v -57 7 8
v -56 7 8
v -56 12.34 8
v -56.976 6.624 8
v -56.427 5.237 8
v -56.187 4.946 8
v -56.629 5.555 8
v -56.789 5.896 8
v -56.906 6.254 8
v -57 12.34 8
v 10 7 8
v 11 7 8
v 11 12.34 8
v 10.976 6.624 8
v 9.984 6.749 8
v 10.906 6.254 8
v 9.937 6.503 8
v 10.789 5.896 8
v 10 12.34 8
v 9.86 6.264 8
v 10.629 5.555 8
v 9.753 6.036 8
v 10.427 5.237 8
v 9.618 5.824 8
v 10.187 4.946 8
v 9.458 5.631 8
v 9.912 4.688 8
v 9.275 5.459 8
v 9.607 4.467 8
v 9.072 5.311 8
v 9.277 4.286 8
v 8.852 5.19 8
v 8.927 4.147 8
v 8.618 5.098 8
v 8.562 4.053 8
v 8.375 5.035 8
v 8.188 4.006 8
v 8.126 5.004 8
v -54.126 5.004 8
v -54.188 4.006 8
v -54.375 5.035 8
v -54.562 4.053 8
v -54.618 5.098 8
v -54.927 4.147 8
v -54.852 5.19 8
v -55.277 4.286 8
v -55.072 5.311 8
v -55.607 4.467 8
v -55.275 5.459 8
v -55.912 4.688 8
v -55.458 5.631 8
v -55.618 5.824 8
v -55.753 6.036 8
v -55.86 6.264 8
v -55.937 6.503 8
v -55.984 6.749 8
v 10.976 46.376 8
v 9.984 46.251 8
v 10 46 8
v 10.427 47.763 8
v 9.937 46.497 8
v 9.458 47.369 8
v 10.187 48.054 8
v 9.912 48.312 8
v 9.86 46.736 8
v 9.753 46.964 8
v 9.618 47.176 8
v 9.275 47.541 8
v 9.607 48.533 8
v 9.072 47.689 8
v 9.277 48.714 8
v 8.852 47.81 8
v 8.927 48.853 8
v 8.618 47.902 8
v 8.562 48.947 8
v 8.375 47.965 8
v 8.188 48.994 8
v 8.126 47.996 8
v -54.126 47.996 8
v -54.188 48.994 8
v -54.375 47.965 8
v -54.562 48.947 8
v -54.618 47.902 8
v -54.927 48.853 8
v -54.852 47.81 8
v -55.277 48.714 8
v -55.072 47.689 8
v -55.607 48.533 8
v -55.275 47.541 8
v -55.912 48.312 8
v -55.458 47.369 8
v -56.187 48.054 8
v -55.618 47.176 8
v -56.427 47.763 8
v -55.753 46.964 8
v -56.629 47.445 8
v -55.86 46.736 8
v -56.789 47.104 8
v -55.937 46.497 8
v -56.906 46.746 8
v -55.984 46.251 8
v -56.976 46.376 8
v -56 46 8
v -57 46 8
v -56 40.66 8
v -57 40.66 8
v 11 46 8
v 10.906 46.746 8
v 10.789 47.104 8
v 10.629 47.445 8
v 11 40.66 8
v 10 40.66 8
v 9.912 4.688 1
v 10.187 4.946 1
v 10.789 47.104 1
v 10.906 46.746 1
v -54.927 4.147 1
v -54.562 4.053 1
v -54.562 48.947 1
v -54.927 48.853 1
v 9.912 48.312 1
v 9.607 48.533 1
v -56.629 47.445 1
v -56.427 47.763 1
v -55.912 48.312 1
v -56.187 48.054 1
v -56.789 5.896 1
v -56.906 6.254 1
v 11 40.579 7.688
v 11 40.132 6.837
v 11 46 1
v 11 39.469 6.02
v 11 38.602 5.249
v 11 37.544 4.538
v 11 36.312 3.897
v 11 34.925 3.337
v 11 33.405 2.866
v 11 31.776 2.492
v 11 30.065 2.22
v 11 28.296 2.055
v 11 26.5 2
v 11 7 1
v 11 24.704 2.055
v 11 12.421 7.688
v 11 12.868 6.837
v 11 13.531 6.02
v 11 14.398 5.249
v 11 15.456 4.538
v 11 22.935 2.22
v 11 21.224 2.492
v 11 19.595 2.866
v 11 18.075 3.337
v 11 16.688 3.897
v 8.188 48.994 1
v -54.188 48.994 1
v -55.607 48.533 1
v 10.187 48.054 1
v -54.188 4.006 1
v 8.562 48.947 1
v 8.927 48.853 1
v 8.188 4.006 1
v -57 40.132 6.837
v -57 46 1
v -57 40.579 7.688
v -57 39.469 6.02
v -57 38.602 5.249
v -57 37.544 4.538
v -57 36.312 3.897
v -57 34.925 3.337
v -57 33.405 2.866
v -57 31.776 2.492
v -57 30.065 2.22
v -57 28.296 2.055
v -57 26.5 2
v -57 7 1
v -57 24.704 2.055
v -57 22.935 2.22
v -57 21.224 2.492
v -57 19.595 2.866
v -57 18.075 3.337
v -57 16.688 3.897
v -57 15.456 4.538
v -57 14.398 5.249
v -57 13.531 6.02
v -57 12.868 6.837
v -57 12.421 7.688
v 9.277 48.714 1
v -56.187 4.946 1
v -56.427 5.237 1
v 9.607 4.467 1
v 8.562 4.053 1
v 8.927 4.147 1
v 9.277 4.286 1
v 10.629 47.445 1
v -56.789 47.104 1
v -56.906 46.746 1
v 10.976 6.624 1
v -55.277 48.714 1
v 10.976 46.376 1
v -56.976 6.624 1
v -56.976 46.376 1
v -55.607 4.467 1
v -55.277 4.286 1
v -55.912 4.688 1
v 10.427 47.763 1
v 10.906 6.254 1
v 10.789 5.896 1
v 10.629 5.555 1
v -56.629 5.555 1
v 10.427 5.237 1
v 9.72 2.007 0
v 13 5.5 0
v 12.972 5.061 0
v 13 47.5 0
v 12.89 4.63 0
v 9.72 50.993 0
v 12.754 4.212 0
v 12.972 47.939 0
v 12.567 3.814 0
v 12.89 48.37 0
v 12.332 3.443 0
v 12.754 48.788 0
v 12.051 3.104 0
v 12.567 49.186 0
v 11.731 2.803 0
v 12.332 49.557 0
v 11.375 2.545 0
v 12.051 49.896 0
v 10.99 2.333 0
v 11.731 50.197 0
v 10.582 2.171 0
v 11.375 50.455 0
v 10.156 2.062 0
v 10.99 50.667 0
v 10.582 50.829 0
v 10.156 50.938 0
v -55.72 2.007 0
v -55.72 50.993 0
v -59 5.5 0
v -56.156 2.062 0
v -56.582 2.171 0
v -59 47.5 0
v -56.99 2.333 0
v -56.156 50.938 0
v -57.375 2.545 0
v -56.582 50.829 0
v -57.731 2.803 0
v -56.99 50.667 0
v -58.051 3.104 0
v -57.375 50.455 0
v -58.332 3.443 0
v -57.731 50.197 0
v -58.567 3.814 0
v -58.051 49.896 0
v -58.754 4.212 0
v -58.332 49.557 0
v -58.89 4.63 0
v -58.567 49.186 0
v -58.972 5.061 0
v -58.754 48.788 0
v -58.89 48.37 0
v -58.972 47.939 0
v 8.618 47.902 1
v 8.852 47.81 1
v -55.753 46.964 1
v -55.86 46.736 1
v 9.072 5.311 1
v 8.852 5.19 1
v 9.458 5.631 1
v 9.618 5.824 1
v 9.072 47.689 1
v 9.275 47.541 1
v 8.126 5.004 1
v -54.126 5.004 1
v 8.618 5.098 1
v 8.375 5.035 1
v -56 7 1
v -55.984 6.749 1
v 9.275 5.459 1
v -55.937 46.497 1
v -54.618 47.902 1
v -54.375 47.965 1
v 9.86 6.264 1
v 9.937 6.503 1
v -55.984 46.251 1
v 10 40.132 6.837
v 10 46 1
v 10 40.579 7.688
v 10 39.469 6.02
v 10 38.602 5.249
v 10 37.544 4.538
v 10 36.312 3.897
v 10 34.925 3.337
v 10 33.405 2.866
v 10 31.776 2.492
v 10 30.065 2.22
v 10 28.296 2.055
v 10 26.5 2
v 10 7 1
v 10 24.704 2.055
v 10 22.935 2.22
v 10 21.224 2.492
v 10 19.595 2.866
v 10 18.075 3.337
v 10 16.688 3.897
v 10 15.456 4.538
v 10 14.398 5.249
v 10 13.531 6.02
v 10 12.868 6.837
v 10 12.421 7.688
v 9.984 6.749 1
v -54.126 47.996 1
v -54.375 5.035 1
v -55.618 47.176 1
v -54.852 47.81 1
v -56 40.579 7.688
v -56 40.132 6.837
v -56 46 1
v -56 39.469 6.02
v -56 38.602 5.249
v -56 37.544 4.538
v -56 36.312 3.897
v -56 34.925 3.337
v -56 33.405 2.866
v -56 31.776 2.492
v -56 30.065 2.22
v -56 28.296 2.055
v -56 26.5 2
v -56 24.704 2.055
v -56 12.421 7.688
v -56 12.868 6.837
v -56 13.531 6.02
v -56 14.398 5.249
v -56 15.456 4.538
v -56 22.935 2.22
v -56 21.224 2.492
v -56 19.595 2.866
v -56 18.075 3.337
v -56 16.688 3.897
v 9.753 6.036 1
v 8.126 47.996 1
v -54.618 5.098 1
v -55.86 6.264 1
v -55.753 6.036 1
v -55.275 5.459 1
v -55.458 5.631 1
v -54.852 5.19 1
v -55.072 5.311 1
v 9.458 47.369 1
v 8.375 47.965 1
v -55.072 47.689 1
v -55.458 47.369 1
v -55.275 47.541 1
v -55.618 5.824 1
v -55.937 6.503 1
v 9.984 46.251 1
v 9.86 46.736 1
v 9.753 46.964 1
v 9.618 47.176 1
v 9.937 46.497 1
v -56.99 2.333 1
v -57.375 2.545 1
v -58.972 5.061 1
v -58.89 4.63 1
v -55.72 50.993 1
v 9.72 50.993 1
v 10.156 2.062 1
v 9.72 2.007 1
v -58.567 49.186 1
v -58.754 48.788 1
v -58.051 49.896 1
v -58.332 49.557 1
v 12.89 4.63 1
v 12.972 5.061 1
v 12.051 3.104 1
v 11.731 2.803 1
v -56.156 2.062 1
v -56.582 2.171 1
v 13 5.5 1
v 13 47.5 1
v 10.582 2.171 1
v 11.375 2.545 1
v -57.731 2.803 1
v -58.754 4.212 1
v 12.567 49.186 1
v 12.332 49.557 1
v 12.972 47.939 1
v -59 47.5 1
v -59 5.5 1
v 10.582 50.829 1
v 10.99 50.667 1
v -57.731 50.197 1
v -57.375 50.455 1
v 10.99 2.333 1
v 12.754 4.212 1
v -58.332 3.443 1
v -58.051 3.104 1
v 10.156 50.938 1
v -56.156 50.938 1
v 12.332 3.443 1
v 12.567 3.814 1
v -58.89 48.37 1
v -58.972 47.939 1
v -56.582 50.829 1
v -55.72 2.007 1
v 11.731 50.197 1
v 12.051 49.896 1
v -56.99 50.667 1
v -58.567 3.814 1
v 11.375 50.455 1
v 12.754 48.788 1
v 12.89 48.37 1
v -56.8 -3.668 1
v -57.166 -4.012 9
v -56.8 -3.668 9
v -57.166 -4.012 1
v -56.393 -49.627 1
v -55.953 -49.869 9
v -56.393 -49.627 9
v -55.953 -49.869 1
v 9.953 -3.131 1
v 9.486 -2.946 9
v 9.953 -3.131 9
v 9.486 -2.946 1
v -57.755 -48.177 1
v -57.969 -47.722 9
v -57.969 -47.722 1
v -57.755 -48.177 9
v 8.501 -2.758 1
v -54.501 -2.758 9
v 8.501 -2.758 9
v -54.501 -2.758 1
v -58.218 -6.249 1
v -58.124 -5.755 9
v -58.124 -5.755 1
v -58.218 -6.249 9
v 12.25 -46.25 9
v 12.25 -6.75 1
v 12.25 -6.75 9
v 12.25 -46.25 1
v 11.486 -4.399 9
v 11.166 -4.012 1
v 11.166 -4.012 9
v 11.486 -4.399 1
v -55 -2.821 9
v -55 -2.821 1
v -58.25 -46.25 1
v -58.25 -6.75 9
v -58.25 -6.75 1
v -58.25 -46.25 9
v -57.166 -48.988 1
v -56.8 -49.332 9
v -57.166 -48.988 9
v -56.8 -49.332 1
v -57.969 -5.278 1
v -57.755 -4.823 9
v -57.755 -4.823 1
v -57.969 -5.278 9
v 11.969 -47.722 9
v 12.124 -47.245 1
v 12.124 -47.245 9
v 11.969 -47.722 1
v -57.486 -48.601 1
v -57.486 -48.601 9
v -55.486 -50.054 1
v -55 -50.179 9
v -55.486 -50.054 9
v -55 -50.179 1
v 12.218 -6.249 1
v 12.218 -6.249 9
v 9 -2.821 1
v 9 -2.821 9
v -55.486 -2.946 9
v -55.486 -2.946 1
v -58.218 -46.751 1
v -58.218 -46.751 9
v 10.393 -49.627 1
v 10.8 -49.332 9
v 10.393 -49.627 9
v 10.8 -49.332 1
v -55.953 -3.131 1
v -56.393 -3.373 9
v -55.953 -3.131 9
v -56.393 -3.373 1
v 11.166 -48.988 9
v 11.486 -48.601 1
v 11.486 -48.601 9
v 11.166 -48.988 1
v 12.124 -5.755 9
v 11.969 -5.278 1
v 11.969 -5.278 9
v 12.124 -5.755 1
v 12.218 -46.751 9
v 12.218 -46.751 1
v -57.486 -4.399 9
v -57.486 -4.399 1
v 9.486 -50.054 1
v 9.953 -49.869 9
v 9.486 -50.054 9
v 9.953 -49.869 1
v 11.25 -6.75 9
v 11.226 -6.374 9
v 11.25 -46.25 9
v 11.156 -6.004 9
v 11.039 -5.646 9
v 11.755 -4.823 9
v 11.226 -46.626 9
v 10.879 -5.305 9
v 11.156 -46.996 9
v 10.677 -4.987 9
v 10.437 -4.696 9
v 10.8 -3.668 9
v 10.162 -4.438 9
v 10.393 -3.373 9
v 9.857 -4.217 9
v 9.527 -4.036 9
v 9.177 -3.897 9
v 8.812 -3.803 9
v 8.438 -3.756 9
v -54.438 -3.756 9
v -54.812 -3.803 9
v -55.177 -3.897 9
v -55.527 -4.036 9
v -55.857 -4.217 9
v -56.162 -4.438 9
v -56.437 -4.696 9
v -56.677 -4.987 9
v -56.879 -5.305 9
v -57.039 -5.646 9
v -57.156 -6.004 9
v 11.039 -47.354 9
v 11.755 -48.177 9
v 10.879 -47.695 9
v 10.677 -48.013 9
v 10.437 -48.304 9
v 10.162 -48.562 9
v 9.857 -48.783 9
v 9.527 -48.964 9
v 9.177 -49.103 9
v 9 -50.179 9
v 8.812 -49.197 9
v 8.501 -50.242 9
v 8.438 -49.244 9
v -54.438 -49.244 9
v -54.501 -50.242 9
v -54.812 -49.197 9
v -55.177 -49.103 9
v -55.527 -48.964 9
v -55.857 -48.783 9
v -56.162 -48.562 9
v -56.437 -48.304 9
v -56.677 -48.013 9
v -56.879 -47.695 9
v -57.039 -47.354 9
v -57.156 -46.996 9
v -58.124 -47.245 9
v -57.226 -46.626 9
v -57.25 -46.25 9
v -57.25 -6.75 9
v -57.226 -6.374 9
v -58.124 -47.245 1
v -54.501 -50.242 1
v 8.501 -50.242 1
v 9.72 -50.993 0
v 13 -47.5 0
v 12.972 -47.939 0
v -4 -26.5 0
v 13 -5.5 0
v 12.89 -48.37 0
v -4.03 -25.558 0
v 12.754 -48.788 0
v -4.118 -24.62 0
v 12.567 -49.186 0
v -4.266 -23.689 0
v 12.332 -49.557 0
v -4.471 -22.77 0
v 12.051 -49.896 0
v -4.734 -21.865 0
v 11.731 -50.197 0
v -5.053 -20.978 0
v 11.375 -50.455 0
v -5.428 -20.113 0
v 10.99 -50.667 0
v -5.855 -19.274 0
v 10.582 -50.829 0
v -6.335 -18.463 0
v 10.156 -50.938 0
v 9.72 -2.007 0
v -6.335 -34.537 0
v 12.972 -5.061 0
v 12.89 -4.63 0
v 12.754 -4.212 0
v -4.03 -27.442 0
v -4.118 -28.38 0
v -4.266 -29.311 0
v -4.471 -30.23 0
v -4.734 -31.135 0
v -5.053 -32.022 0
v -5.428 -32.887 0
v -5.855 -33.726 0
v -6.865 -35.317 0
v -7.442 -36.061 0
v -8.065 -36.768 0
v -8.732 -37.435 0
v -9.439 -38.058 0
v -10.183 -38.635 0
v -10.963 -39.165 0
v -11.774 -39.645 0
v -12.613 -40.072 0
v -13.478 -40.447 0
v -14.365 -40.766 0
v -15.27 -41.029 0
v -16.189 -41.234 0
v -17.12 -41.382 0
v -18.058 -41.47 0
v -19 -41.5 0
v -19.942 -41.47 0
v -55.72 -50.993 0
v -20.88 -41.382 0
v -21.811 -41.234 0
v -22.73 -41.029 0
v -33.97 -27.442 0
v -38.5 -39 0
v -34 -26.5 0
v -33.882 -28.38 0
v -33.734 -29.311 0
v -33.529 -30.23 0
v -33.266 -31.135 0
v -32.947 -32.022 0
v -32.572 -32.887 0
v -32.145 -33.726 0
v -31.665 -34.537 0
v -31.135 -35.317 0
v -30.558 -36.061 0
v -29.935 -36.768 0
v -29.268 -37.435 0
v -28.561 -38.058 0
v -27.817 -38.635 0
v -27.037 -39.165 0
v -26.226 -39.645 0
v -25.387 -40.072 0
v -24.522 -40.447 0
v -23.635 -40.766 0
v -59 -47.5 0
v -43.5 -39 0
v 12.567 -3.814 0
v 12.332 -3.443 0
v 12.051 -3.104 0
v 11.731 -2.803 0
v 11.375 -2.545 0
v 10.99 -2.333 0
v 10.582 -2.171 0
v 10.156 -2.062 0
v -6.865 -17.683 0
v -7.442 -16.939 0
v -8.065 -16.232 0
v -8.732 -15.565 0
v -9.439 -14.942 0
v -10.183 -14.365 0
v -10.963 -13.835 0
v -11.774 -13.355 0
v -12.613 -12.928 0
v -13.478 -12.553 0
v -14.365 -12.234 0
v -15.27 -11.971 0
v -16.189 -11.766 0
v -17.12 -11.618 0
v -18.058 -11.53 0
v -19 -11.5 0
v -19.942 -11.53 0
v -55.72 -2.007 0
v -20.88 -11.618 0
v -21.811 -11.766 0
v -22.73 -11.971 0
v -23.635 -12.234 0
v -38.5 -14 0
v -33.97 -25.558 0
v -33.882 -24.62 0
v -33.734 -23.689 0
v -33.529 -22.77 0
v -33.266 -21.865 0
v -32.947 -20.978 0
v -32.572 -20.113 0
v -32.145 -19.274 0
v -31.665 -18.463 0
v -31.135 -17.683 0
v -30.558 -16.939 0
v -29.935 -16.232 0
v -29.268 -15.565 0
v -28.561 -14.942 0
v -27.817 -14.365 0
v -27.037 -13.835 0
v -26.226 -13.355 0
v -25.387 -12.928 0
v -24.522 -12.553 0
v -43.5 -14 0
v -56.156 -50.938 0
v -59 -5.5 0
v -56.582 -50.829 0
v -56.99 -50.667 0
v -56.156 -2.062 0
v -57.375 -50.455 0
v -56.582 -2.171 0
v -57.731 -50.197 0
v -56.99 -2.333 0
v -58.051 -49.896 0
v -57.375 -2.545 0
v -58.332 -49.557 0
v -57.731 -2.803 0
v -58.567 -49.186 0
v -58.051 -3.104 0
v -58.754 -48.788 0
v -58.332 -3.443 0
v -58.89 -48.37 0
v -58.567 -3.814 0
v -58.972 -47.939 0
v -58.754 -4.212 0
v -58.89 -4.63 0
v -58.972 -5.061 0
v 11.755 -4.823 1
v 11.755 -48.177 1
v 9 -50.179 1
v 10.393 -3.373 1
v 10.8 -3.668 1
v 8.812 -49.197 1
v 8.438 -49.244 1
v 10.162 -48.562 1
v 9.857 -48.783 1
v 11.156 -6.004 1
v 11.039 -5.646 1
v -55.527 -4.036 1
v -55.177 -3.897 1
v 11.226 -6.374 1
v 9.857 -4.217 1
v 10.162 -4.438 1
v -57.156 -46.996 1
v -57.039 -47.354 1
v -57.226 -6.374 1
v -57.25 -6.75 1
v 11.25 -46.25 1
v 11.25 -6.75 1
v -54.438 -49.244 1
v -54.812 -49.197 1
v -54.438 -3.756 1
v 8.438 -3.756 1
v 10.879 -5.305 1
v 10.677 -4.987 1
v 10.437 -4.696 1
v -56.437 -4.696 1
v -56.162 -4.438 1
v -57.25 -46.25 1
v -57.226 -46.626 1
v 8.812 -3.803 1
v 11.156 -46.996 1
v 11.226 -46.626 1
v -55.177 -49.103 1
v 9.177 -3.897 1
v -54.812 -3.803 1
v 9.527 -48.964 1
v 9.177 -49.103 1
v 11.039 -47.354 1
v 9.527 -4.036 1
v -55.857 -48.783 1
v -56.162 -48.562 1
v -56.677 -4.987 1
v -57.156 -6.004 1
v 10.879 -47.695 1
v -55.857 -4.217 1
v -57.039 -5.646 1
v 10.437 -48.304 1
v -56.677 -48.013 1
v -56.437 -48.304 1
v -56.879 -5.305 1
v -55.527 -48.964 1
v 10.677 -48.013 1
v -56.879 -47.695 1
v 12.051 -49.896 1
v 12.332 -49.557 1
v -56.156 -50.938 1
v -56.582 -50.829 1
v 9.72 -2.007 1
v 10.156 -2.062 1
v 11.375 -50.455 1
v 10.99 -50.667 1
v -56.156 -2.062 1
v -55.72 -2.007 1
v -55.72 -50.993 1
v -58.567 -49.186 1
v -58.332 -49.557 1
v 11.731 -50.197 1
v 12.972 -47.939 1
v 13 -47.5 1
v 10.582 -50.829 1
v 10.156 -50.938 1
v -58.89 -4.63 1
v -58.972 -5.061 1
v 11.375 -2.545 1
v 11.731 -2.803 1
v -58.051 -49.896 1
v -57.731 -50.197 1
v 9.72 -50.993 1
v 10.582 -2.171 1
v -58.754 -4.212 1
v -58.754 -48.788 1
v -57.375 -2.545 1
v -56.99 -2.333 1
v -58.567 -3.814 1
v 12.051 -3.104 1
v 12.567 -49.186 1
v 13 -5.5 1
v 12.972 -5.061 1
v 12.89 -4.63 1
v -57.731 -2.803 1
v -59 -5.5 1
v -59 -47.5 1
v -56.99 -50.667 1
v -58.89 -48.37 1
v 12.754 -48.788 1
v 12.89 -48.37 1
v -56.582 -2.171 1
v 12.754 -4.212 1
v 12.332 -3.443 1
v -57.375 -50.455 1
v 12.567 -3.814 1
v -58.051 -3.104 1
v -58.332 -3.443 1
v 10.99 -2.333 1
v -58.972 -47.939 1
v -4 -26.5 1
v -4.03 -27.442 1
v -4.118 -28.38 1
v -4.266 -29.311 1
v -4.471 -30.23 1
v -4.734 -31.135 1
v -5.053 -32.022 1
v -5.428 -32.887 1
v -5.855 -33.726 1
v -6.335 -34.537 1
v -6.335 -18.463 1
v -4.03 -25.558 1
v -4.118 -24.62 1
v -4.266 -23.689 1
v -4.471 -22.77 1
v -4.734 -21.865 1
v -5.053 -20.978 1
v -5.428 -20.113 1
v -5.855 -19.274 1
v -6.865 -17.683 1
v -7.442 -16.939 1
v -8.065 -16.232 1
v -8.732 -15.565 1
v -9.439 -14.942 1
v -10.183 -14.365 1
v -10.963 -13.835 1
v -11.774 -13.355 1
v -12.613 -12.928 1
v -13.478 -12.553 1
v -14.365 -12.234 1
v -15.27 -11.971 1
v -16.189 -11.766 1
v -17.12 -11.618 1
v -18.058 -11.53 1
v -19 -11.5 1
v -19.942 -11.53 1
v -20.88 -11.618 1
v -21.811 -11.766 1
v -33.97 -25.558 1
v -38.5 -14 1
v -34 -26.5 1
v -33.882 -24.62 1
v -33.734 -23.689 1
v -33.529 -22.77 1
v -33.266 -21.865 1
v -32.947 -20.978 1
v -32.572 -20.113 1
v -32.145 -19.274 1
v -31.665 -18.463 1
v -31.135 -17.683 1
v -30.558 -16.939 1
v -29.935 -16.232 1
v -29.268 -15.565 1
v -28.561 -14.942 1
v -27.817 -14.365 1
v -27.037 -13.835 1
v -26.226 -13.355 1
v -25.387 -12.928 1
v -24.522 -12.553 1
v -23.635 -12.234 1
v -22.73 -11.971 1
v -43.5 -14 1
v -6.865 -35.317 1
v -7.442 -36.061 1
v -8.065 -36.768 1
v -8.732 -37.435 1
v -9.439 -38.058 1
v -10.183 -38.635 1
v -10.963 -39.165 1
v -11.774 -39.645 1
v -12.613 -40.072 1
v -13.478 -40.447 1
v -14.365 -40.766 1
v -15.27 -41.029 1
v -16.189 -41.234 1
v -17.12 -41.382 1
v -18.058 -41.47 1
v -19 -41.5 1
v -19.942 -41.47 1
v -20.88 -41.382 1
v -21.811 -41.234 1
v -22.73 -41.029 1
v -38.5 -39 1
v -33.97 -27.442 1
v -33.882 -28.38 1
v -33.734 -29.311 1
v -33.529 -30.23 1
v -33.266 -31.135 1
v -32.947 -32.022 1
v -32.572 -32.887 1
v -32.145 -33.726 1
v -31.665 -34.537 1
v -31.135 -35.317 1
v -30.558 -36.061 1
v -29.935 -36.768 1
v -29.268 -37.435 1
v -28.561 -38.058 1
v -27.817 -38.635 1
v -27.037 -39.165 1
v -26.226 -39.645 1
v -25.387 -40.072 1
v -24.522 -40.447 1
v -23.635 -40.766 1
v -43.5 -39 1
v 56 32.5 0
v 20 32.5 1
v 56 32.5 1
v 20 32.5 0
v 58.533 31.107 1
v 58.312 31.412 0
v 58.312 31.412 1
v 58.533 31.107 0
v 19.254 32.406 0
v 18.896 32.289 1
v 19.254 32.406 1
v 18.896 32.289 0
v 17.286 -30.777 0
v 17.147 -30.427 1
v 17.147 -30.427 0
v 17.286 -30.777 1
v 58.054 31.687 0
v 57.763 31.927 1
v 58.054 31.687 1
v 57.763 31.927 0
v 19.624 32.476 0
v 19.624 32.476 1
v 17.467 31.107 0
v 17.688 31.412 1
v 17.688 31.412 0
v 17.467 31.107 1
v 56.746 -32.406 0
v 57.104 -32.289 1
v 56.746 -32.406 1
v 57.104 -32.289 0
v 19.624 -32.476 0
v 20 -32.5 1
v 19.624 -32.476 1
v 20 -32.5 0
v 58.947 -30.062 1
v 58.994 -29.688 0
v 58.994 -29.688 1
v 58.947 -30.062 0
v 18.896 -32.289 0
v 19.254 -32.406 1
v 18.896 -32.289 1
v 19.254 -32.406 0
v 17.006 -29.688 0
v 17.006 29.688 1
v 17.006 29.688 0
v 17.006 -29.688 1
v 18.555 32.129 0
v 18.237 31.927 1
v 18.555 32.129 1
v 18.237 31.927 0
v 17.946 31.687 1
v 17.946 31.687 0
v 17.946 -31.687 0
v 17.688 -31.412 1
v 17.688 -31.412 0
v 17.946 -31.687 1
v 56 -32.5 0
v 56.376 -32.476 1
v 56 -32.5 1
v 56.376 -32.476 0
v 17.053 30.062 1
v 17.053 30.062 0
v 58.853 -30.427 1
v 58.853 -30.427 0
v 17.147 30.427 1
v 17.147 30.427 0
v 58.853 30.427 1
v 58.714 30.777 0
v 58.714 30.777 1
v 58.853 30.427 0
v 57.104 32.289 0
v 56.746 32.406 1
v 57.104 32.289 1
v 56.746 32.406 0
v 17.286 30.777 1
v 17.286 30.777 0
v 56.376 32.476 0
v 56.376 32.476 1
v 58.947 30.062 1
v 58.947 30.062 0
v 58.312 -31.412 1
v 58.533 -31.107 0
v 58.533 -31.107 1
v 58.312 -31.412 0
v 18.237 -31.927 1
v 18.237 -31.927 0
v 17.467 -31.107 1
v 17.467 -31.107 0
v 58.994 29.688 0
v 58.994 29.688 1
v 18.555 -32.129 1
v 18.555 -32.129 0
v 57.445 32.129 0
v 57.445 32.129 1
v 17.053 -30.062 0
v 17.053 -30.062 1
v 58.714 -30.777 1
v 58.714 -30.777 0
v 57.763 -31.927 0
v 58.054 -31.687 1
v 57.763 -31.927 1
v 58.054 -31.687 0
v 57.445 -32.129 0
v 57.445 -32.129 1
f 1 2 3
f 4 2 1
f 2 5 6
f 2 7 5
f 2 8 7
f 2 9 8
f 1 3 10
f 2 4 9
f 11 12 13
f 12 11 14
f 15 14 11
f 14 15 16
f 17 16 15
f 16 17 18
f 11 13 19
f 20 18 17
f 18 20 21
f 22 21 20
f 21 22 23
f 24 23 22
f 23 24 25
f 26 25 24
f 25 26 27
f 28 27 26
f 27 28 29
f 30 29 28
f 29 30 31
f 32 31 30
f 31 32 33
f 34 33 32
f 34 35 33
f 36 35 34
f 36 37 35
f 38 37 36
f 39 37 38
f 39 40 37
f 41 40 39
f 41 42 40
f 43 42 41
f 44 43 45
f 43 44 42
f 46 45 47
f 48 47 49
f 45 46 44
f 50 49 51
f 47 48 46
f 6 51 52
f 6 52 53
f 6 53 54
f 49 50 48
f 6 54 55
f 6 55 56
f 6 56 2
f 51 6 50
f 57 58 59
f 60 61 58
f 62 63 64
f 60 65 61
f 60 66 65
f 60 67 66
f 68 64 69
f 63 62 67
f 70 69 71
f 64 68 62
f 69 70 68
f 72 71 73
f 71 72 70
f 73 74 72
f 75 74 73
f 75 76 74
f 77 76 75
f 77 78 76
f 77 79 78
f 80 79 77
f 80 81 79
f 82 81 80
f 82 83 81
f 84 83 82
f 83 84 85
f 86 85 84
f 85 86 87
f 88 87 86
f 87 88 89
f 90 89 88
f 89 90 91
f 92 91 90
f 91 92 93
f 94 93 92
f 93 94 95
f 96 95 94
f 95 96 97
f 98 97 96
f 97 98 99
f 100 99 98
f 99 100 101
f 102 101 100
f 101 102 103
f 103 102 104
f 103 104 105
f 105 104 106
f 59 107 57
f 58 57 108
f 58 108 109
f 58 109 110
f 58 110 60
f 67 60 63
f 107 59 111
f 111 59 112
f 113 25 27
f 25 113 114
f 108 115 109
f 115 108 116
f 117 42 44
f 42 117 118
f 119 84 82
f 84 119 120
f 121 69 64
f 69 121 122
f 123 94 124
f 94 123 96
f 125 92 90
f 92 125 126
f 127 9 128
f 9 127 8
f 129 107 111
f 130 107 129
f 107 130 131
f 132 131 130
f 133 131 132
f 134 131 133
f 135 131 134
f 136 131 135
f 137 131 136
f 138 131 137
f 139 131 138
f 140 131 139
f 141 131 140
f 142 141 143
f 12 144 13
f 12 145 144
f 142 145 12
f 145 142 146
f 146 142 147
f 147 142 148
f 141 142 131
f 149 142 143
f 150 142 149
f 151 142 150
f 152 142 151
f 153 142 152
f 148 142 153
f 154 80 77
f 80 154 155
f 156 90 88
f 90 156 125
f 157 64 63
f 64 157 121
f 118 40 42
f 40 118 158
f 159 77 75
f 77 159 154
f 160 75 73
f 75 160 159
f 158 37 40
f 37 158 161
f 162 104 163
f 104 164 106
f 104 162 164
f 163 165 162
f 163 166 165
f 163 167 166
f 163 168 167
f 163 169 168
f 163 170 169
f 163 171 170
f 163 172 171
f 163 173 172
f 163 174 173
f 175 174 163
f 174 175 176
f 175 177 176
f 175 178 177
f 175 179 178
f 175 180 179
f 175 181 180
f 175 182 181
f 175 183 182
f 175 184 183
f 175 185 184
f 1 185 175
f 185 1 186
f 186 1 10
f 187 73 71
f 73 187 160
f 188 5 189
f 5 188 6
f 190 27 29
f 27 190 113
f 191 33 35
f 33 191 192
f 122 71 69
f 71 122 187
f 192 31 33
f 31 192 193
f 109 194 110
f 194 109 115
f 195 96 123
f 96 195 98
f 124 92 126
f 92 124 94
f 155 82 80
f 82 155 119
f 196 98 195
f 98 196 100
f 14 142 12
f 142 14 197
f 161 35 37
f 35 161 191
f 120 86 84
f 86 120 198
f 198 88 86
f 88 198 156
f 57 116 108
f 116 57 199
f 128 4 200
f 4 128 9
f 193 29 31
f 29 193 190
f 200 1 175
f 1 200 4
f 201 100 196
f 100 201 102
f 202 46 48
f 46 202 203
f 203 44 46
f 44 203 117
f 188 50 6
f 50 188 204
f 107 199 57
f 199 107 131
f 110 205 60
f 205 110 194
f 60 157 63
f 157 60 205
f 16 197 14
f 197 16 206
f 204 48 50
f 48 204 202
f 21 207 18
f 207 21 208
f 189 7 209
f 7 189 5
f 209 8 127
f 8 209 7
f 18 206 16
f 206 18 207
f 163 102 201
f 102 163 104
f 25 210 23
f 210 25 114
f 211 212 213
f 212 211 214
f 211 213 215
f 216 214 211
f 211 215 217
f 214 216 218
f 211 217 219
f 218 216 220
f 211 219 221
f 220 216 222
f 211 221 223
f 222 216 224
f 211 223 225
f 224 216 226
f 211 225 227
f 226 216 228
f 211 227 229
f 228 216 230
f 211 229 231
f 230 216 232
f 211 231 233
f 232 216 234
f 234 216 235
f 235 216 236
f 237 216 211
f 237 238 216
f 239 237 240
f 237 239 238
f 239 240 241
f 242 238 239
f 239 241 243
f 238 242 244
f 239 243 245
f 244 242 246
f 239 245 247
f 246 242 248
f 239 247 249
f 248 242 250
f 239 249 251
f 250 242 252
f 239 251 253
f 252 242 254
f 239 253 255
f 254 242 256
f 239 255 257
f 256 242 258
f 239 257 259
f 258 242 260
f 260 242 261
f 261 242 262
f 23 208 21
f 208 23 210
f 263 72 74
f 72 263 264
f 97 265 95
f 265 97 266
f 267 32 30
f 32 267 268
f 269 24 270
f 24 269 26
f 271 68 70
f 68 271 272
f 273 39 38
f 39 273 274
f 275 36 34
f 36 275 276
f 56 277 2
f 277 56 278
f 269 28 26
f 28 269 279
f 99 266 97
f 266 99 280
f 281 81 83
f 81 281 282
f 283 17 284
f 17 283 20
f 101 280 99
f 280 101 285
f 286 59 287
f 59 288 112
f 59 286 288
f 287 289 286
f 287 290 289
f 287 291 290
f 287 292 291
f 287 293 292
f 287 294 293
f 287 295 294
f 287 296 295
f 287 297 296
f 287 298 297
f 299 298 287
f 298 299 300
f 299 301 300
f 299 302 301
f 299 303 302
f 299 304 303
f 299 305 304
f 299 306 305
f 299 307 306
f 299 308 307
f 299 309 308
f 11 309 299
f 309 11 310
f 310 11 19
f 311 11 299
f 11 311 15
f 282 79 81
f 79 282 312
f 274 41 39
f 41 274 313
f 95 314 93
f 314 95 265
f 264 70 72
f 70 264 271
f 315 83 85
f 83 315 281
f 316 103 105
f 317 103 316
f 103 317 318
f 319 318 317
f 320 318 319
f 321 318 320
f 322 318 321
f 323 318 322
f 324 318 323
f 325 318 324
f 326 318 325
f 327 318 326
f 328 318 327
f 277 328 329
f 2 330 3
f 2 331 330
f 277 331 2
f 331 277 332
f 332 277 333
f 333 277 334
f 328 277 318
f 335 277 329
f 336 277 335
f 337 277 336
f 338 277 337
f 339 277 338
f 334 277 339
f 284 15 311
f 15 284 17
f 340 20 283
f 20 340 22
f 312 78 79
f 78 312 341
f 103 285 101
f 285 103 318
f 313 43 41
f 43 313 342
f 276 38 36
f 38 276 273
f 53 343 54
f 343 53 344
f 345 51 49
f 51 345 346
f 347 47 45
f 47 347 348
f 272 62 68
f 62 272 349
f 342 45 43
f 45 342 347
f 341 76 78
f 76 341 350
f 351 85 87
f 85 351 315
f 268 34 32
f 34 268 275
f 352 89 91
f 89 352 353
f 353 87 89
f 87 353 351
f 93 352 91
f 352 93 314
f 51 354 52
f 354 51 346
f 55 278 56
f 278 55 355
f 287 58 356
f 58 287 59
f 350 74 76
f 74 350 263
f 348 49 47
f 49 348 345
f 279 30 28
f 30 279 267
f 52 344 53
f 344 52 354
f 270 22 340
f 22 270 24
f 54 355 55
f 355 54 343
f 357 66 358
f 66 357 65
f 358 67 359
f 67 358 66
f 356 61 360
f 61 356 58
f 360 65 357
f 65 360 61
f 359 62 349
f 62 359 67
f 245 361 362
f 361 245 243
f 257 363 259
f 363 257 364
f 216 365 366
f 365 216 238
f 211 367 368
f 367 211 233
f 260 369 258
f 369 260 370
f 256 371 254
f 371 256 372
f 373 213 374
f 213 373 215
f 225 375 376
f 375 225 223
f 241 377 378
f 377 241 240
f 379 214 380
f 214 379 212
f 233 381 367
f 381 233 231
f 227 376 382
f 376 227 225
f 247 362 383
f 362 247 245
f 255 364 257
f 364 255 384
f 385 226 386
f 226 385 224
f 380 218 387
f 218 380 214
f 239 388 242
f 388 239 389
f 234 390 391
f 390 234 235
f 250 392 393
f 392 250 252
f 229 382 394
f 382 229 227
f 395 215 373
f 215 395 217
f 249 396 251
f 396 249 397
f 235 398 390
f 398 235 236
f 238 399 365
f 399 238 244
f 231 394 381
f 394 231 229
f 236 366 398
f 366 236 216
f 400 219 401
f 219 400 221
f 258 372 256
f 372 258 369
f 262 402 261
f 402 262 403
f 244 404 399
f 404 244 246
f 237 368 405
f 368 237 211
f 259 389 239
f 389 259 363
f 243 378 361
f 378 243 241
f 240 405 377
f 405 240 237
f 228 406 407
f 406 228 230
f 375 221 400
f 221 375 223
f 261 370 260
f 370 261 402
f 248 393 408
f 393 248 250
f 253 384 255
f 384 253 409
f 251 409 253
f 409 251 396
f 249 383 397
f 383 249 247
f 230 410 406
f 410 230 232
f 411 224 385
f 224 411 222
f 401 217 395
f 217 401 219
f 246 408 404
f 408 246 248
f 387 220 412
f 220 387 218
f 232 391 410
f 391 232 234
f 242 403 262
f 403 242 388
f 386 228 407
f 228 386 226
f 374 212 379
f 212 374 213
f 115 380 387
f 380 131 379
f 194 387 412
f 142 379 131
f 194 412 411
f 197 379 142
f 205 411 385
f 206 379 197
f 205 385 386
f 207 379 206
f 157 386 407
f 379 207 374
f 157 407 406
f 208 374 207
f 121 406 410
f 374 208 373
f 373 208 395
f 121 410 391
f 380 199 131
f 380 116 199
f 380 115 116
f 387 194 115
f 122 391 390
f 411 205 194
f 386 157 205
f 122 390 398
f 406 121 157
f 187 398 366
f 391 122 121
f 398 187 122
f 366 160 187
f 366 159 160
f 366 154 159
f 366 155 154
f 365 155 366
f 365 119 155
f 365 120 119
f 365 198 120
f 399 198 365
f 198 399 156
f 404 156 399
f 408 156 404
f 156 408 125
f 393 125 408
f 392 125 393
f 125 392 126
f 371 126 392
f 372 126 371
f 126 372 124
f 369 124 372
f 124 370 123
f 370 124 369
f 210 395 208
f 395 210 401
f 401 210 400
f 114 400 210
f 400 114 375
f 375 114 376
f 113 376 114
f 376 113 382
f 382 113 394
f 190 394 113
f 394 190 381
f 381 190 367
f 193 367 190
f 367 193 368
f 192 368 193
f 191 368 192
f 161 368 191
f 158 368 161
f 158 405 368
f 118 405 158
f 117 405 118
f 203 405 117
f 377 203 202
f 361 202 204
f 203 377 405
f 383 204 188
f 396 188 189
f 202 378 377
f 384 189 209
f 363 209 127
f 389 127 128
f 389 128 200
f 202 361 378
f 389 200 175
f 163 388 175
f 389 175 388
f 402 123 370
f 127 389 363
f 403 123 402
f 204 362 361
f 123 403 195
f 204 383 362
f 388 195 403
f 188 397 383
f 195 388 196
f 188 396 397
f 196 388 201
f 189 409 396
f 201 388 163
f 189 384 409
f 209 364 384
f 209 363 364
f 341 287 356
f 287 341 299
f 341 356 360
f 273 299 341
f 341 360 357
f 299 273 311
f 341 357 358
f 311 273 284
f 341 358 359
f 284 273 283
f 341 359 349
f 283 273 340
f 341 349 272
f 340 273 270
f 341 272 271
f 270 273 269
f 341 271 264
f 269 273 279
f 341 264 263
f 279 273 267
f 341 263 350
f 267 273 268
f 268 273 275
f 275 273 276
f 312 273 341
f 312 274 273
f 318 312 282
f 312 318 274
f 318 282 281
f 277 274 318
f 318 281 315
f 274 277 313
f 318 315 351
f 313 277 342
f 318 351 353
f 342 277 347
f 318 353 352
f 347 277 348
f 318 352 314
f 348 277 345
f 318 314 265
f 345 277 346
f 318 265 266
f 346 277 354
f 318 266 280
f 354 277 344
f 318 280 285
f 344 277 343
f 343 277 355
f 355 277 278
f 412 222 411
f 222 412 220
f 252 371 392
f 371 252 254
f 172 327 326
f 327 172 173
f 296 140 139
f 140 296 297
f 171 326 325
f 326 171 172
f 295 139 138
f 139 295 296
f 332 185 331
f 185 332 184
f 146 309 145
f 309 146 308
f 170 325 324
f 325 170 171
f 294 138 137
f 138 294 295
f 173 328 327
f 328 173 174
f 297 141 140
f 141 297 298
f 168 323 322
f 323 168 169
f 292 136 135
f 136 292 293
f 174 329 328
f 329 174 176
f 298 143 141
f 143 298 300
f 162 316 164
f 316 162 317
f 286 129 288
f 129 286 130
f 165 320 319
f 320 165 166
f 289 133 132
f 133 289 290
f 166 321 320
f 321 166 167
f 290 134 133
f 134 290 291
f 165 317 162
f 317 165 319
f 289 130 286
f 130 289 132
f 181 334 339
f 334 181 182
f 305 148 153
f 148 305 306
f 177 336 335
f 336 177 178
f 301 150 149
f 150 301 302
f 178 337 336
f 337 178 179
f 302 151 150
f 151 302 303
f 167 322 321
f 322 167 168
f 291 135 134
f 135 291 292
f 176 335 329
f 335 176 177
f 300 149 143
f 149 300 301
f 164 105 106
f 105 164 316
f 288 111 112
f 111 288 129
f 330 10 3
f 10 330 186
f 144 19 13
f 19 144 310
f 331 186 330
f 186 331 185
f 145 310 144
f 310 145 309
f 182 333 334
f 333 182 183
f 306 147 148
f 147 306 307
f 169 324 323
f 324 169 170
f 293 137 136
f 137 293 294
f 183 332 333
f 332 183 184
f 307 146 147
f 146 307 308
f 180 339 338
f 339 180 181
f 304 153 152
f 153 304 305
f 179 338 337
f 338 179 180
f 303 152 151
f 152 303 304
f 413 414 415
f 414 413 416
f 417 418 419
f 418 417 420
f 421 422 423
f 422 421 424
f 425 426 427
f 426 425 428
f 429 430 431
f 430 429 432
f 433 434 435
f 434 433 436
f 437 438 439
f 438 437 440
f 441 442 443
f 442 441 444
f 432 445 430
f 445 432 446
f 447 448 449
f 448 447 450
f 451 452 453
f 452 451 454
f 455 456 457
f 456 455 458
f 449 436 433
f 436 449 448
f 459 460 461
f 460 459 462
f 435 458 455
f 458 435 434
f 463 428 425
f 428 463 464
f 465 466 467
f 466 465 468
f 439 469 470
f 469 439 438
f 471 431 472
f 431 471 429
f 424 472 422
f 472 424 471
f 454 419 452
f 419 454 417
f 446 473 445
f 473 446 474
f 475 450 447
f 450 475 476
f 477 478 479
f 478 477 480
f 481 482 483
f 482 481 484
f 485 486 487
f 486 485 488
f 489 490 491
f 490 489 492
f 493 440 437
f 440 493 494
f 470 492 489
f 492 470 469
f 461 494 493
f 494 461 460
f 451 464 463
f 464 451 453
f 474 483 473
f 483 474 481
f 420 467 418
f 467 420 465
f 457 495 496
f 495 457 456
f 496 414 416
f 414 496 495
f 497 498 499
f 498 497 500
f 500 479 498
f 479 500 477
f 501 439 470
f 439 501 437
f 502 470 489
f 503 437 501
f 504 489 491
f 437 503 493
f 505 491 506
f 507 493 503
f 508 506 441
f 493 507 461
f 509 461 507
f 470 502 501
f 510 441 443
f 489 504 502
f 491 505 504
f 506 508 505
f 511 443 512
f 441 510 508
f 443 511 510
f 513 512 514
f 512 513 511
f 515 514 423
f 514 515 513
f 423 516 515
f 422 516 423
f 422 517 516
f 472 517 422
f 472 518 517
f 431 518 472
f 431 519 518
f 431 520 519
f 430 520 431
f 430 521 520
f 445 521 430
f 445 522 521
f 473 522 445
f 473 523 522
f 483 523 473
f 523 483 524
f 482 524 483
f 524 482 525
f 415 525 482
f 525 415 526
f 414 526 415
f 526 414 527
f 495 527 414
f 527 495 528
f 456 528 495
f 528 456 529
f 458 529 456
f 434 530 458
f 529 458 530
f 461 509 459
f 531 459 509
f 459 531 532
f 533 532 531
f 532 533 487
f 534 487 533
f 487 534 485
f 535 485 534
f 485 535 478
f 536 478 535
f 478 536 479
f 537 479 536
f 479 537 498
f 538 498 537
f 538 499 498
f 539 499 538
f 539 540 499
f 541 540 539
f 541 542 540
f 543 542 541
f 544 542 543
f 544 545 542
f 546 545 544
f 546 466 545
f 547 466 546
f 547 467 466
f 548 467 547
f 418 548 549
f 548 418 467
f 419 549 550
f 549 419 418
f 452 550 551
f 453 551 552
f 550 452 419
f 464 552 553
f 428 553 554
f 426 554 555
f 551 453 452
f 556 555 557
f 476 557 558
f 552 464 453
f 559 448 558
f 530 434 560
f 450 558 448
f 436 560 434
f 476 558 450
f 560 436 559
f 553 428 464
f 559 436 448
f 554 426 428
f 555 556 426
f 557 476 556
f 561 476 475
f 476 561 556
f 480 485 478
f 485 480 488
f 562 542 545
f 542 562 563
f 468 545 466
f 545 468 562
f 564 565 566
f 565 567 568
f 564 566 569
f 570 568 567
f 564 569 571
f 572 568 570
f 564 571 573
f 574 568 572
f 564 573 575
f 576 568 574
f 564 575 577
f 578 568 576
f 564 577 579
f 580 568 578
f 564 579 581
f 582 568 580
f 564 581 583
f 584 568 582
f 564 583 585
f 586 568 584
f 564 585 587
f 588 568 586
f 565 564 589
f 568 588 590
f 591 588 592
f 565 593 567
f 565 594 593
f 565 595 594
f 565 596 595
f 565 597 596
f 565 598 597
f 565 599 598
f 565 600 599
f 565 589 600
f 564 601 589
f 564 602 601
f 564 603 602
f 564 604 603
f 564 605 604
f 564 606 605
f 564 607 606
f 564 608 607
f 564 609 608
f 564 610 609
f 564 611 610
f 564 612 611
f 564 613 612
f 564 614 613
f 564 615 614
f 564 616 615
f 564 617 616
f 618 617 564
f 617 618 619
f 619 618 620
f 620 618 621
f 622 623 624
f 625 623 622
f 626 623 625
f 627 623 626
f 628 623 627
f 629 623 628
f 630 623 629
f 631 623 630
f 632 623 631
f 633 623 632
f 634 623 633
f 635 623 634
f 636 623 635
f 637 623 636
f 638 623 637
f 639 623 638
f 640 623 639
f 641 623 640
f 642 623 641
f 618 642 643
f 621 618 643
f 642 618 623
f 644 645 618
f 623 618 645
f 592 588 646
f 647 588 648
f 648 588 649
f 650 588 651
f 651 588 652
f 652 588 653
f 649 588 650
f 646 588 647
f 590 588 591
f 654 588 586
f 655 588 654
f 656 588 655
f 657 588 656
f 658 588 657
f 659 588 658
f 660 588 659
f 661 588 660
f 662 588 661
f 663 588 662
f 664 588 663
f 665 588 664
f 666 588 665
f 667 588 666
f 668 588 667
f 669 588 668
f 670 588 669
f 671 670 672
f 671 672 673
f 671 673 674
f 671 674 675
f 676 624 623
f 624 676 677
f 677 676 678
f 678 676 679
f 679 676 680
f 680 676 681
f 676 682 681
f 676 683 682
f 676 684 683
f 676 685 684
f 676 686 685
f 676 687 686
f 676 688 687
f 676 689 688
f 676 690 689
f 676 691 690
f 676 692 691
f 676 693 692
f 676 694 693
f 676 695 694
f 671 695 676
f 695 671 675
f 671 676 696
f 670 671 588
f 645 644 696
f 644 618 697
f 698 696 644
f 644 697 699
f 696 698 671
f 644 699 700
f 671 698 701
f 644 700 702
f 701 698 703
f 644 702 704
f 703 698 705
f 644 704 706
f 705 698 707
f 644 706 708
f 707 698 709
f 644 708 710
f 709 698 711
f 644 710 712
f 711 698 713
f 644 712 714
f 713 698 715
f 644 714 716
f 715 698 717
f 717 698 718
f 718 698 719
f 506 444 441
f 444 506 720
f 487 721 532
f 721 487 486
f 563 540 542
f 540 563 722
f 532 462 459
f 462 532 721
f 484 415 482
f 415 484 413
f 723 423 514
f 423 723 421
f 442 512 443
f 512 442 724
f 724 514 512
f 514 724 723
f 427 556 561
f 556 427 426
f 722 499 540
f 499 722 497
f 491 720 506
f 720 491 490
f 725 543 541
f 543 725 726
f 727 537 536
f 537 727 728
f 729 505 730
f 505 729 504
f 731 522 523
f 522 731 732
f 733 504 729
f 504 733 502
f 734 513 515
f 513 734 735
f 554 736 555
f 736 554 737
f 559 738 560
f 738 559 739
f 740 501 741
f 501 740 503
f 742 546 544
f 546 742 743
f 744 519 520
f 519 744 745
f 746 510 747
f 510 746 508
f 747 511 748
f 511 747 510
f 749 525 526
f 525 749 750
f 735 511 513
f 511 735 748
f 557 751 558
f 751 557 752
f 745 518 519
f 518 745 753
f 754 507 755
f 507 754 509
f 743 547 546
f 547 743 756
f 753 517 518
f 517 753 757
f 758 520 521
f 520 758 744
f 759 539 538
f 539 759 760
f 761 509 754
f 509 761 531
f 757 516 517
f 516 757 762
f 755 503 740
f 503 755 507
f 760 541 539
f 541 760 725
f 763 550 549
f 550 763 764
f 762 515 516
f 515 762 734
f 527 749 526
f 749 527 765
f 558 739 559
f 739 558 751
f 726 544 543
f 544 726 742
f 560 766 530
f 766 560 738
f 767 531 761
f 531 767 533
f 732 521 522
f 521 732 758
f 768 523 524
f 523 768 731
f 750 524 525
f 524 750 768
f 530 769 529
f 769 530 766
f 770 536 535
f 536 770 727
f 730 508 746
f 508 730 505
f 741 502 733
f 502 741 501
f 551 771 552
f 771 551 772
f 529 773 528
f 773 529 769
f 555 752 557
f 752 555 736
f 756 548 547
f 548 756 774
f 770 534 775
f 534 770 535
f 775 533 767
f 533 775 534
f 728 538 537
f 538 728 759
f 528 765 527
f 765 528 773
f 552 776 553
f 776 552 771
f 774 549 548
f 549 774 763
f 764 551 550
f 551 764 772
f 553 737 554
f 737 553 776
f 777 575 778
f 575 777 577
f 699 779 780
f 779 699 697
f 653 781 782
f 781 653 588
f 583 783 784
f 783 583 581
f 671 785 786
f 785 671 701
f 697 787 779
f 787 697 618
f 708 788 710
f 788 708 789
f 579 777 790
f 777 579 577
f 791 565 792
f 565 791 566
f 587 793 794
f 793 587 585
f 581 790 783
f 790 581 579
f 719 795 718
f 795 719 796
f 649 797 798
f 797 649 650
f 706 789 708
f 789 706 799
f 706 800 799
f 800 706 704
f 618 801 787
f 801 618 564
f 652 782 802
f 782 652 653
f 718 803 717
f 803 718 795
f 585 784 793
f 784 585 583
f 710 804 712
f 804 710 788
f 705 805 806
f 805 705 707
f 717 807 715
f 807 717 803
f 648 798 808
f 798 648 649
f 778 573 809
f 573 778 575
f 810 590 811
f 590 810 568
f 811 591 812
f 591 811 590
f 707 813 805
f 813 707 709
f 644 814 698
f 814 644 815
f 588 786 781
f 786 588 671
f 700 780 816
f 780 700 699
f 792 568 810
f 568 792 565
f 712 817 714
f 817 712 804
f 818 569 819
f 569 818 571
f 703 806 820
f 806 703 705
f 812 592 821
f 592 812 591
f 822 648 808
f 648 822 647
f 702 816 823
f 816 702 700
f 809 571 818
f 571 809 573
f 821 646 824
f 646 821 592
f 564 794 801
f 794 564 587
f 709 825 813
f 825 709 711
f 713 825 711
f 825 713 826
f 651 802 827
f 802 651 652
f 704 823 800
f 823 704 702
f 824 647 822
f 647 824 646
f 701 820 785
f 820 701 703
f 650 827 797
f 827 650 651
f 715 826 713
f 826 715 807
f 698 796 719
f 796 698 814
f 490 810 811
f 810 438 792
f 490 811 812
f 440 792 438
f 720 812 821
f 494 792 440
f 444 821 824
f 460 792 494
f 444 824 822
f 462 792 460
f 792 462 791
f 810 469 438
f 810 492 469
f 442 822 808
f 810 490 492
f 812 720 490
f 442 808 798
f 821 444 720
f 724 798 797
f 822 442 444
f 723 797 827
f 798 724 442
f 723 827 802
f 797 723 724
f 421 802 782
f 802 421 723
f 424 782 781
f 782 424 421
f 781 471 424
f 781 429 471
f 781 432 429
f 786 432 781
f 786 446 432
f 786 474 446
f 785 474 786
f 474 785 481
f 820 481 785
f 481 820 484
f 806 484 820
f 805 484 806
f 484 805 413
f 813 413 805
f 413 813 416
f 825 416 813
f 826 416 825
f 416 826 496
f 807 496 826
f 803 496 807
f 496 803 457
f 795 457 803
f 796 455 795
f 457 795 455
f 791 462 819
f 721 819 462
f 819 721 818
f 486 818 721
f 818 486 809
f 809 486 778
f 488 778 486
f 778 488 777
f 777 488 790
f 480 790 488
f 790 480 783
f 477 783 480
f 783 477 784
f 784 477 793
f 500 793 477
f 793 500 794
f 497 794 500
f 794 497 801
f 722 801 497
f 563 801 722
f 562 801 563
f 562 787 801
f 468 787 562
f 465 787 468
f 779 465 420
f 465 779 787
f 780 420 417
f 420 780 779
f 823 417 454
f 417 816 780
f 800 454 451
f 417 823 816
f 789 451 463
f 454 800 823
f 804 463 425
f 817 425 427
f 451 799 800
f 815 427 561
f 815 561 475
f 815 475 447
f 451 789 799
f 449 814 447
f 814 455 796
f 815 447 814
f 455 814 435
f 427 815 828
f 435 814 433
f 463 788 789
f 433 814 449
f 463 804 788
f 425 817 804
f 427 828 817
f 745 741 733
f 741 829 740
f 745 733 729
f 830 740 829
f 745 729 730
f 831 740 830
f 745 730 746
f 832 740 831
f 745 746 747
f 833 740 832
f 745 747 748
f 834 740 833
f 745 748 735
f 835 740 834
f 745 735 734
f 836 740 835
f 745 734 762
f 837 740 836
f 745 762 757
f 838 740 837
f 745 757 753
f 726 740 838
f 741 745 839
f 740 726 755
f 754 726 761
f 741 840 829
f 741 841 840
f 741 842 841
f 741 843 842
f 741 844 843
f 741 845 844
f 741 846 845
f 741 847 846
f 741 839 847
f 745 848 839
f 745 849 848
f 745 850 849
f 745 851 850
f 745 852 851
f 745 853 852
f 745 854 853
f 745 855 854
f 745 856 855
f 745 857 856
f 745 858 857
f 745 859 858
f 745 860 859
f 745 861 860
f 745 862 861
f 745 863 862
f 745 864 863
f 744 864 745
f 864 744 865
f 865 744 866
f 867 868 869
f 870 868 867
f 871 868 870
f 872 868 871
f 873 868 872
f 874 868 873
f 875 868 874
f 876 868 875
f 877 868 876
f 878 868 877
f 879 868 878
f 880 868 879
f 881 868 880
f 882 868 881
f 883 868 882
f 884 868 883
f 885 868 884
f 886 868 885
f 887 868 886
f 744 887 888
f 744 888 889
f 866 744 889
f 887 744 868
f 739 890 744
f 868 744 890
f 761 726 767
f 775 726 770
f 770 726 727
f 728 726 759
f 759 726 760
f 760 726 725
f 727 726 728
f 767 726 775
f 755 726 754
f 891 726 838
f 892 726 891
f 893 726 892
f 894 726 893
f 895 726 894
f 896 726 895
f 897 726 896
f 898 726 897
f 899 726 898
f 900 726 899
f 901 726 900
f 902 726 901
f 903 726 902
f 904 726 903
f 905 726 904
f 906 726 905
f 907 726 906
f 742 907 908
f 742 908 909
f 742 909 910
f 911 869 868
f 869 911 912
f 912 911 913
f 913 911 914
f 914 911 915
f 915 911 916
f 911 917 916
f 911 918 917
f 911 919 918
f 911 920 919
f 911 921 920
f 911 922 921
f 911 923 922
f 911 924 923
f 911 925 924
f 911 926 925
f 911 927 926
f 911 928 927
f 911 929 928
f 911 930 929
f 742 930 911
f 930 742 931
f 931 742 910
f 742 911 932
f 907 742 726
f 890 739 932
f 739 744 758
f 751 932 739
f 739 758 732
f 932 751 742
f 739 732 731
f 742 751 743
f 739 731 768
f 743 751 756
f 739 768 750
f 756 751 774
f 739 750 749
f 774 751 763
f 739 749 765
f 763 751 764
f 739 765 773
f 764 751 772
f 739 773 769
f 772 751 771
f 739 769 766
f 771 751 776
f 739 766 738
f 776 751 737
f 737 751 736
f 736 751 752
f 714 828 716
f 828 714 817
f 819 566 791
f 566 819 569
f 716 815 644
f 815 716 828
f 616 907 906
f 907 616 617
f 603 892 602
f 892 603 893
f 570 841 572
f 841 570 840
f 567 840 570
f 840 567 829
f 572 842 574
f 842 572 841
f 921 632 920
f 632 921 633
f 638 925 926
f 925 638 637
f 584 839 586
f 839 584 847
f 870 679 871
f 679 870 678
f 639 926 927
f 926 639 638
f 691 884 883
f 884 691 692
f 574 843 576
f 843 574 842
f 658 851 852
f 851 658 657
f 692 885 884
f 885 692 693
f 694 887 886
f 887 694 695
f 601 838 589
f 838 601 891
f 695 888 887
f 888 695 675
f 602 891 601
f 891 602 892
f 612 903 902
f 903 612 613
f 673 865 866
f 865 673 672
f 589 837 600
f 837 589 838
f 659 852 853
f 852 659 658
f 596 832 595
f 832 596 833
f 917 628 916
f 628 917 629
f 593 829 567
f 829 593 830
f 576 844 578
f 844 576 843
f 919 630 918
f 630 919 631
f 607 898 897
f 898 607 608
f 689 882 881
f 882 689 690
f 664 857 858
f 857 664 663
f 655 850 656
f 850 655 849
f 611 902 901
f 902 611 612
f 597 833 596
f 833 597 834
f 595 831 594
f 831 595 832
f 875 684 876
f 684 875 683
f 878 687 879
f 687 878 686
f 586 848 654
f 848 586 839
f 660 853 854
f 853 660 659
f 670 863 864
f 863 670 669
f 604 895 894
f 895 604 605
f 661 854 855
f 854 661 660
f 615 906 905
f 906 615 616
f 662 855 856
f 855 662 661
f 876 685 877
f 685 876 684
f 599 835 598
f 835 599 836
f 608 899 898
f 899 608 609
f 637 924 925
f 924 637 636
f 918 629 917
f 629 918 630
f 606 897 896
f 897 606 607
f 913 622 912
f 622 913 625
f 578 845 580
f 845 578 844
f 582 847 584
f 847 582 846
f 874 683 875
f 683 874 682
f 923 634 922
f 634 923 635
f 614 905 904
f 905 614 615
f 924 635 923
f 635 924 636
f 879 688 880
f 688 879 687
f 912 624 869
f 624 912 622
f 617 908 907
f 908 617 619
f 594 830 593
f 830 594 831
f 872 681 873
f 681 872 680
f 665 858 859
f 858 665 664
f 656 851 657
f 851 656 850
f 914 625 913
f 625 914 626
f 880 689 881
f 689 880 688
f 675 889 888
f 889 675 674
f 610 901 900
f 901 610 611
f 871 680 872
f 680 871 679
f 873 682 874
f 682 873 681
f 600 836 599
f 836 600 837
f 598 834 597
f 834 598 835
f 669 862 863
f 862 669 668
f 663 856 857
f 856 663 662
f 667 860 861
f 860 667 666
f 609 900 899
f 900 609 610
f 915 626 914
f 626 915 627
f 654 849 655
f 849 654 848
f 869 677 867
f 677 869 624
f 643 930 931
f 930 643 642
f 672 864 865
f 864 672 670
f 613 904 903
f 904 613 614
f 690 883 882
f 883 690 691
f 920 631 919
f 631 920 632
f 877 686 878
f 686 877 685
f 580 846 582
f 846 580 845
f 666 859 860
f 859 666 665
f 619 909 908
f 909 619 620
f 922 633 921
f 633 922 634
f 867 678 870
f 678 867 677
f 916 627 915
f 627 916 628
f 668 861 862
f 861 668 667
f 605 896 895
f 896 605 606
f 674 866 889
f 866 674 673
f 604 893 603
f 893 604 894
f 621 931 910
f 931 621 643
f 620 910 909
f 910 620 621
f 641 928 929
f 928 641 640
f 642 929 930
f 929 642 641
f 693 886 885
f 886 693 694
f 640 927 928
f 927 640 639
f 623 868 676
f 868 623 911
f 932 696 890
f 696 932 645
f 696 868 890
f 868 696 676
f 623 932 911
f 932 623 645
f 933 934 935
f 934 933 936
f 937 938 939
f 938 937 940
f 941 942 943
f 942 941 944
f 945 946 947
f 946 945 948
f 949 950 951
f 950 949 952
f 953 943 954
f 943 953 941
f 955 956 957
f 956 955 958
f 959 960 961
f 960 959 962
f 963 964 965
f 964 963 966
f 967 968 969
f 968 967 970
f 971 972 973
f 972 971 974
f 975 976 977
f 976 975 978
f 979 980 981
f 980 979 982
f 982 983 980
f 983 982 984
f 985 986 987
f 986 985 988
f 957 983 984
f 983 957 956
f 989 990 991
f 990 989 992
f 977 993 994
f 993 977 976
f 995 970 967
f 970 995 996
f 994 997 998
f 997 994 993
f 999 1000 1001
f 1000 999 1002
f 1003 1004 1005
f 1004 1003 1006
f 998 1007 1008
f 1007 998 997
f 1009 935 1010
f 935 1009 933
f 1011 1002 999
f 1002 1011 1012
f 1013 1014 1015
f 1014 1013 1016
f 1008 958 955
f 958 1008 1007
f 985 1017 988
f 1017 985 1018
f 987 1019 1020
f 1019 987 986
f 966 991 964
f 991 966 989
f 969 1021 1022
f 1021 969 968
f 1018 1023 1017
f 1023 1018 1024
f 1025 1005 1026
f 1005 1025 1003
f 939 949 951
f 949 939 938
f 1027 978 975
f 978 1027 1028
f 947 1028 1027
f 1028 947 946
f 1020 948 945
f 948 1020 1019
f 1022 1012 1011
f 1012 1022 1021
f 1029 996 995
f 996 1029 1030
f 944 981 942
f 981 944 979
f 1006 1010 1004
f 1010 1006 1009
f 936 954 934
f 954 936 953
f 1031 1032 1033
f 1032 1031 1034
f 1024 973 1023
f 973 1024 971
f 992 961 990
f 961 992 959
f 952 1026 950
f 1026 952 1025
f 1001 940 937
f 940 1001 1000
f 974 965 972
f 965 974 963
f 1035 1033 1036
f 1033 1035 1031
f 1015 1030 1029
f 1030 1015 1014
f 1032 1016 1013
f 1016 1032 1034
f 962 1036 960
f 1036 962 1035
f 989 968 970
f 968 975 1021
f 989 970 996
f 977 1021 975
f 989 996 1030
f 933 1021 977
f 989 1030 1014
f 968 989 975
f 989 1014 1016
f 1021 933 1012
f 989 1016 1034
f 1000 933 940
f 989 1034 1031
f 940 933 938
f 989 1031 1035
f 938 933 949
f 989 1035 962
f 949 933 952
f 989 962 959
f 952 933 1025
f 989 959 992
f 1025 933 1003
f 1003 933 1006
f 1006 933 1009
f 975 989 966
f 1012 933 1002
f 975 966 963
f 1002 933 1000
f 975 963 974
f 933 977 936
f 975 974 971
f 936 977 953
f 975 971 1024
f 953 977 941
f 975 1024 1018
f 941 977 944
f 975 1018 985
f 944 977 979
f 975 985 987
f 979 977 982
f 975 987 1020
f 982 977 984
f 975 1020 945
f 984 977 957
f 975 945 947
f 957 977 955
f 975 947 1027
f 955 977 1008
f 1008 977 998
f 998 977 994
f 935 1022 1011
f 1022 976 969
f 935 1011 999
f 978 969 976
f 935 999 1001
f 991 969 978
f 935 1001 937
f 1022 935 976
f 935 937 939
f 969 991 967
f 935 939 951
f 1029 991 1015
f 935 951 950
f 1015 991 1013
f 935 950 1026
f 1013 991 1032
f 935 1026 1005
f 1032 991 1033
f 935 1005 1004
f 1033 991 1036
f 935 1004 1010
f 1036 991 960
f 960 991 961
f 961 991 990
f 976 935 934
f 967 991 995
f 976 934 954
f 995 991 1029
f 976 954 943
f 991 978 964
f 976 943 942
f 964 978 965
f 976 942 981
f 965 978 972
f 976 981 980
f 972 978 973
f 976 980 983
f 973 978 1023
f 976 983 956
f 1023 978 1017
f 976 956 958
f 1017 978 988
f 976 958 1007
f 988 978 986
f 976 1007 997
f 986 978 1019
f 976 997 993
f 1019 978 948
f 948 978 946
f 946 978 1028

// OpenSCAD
/*
	Watch out, because all the surfaces are thin.
	Slice with 100% infill
*/

/* [Basic Settings] */

// Which part to print?
part = 0; // [0:Everything, 1:Lid Only, 2:Base Only; 3:DividerOnly]

// Which type of box to print?
CardType = "class"; // [class:Character's class cards,overlord:Overlord cards,custom:Custom]

// Cut a big window to show the card symbol?
CutWindow = 1; //[1:Yes, 0:No]

// Cut a window to show the card label?
CutLabel = 1; //[1:Yes, 0:No]


/* [Settings for Custom] */

CustomHeight = 64;
CustomWidth = 41;
CustomThickness = 5;

CustomWindowX = 30;
CustomWindowY = 30;
CustomWindowOffset = 4;

CustomLabelX = 5;
CustomLabelY = 25;
CustomLabelOffset = -18;


/* [Advanced] */

// Thickness of the walls
t = 1;

// Margin around the cards
Margin = 2;

// Size of the overhang
Overhang = 5;

// Roundness
Roundness = 3;

// Small gap between the base and the lid
gap = 0.5;

/* [Hidden] */

// Sizes of the various predefined card types
ClassSize = [64, 41, 5];
ClassHole = [30, 30, 4]; // X,Y,Offset
ClassLabel = [5, 25, -18]; // X,Y,Offset

OverlordSize = [89, 58, 15];
OverlordHole = [60, 40, 0]; // X,Y,Offset
OverlordLabel = [0, 0, 0]; // X,Y,Offset

// Jitter to ensure there are no coincident-surface problems
j = 0.1;

// Roundness detail. Mostly $fn will be set to this
detail = 50;

// Shortcuts used to make arrays easier to reference
x=0; y=1; z=2;


module TopBottom(card)
{
	h=card[x]+Margin+t+Overhang;
	w=card[y]+Margin+t+Overhang;

	roundbox([h, w, t], Roundness+Overhang/2-t*2, 0);
}


module case(card, hole, label)
{
	if(part == 0)
	{
		translate([-((card[x]+Margin+t+Overhang)+4+(card[y] + Margin / 2))/2, 0, 0])
		translate([(card[x]+Margin+t+Overhang)/2, 0, 0])
		union()
		{
			translate([0, 2, 0])
			translate([0, (card[y]+Margin+t+Overhang)*0.5, 0])
			base(card);

			translate([0, -2, 0])
			translate([0, -(card[y]+Margin+t+Overhang)*0.5, 0])
			lid(card, hole, label);

			translate([4, 0, 0])
			translate([(card[y] + Margin / 2)/2, 0, 0])
			translate([(card[x]+Margin+t+Overhang)/2, 0, 0])
			rotate([0, 0, 90]) 
			divider(card);
		}
	}
	if(part == 1)
	{
		lid(card);
	}
	if(part == 2)
	{
		base(card);
	}
	if(part == 3)
	{
		divider(card);
	}
}


module divider(card)
{
	h=card[x] + Margin / 2;
	w=card[y] + Margin / 2;
	roundness=t*3;

	roundbox([h, w, t], roundness, 0);
}


module base(card)
{
	// The actual size of the base is a bit (one "t") bigger than a card
	h=card[x]+Margin;
	w=card[y]+Margin;
	d=card[z]+Margin;
	
	union()
	{
		difference()
		{
			union()
			{
				// Thin base (widest part)
				TopBottom(card);

				// Walls
				roundbox([h+t*2, w+t*2, d+t], Roundness, t);
			}

			// Thumb holes
			translate([0, 0, d+t*2]) scale([1, 1, d/(w/3)]) 
			rotate([0, 90, 0]) 
			cylinder(r=w/3, h=h+t*2+j*2, center=true, $fn=detail);
			
		}
	}
}


module lid(card, hole, label)
{
	// The outer size of the base is a bit (one "t") bigger than a card
	base_h=card[x]+Margin+t;
	base_w=card[y]+Margin+t;
	base_d=card[z]+Margin+t;
	
	// The size of the lid is a bit (gap) bigger than the base all around
	h=base_h+gap+t;
	w=base_w+gap+t;
	d=base_d;

	r=hole[x]/2;
	s=hole[x]/ (hole[y] == 0 ? 1 : hole[y]); // prevent DivZero
	o=hole[z];

	union()
	{
		difference()
		{
			union()
			{
				// Thin base (widest part)
				TopBottom(card);

				// Walls
				roundbox([h+t*2, w+t*2, d+t], Roundness+t, t);
			}

			if(CutWindow == 1 && hole[x] > 0 && hole[y] > 0)
			{
				// Window
				translate([o, 0, -j]) scale([1, 1/s, 1]) cylinder(r=r, h=t+j*2, $fn=detail*2);
			}
			
			if(CutLabel == 1 && label[x] > 0 && label[y] > 0)
			{
				translate([label[z], 0, t/2]) cube([label[x], label[y], t+j*2], center=true, $fn=detail);
			}
		}
	}
}


// Size is the outside dimension
module roundbox(size, r, t)
{
	difference()
	{
		hull()
		{
			translate([-r, -r, 0]) translate([ size[x]*0.5,  size[y]*0.5, 0]) cylinder(r=r, h=size[z], $fn=detail);
			translate([ r, -r, 0]) translate([-size[x]*0.5,  size[y]*0.5, 0]) cylinder(r=r, h=size[z], $fn=detail);
			translate([-r,  r, 0]) translate([ size[x]*0.5, -size[y]*0.5, 0]) cylinder(r=r, h=size[z], $fn=detail);
			translate([ r,  r, 0]) translate([-size[x]*0.5, -size[y]*0.5, 0]) cylinder(r=r, h=size[z], $fn=detail);
		}
		if(t>0)
		{
			hull()
			{
				translate([-r, -r, -j]) translate([ size[x]*0.5,  size[y]*0.5, 0]) cylinder(r=r-t, h=size[z]+j*2, $fn=detail);
				translate([ r, -r, -j]) translate([-size[x]*0.5,  size[y]*0.5, 0]) cylinder(r=r-t, h=size[z]+j*2, $fn=detail);
				translate([-r,  r, -j]) translate([ size[x]*0.5, -size[y]*0.5, 0]) cylinder(r=r-t, h=size[z]+j*2, $fn=detail);
				translate([ r,  r, -j]) translate([-size[x]*0.5, -size[y]*0.5, 0]) cylinder(r=r-t, h=size[z]+j*2, $fn=detail);
			}
		}
	}
}



if(CardType == "class")
{
	case(ClassSize, ClassHole, ClassLabel);
}
if(CardType == "overlord")
{
	case(OverlordSize, OverlordHole, OverlordLabel);
}
if(CardType == "custom")
{
	case(
		[CustomHeight, CustomWidth, CustomThickness], 
		[CustomWindowX, CustomWindowY, CustomWindowOffset], 
		[CustomLabelX, CustomLabelY, CustomLabelOffset]
	);
}
